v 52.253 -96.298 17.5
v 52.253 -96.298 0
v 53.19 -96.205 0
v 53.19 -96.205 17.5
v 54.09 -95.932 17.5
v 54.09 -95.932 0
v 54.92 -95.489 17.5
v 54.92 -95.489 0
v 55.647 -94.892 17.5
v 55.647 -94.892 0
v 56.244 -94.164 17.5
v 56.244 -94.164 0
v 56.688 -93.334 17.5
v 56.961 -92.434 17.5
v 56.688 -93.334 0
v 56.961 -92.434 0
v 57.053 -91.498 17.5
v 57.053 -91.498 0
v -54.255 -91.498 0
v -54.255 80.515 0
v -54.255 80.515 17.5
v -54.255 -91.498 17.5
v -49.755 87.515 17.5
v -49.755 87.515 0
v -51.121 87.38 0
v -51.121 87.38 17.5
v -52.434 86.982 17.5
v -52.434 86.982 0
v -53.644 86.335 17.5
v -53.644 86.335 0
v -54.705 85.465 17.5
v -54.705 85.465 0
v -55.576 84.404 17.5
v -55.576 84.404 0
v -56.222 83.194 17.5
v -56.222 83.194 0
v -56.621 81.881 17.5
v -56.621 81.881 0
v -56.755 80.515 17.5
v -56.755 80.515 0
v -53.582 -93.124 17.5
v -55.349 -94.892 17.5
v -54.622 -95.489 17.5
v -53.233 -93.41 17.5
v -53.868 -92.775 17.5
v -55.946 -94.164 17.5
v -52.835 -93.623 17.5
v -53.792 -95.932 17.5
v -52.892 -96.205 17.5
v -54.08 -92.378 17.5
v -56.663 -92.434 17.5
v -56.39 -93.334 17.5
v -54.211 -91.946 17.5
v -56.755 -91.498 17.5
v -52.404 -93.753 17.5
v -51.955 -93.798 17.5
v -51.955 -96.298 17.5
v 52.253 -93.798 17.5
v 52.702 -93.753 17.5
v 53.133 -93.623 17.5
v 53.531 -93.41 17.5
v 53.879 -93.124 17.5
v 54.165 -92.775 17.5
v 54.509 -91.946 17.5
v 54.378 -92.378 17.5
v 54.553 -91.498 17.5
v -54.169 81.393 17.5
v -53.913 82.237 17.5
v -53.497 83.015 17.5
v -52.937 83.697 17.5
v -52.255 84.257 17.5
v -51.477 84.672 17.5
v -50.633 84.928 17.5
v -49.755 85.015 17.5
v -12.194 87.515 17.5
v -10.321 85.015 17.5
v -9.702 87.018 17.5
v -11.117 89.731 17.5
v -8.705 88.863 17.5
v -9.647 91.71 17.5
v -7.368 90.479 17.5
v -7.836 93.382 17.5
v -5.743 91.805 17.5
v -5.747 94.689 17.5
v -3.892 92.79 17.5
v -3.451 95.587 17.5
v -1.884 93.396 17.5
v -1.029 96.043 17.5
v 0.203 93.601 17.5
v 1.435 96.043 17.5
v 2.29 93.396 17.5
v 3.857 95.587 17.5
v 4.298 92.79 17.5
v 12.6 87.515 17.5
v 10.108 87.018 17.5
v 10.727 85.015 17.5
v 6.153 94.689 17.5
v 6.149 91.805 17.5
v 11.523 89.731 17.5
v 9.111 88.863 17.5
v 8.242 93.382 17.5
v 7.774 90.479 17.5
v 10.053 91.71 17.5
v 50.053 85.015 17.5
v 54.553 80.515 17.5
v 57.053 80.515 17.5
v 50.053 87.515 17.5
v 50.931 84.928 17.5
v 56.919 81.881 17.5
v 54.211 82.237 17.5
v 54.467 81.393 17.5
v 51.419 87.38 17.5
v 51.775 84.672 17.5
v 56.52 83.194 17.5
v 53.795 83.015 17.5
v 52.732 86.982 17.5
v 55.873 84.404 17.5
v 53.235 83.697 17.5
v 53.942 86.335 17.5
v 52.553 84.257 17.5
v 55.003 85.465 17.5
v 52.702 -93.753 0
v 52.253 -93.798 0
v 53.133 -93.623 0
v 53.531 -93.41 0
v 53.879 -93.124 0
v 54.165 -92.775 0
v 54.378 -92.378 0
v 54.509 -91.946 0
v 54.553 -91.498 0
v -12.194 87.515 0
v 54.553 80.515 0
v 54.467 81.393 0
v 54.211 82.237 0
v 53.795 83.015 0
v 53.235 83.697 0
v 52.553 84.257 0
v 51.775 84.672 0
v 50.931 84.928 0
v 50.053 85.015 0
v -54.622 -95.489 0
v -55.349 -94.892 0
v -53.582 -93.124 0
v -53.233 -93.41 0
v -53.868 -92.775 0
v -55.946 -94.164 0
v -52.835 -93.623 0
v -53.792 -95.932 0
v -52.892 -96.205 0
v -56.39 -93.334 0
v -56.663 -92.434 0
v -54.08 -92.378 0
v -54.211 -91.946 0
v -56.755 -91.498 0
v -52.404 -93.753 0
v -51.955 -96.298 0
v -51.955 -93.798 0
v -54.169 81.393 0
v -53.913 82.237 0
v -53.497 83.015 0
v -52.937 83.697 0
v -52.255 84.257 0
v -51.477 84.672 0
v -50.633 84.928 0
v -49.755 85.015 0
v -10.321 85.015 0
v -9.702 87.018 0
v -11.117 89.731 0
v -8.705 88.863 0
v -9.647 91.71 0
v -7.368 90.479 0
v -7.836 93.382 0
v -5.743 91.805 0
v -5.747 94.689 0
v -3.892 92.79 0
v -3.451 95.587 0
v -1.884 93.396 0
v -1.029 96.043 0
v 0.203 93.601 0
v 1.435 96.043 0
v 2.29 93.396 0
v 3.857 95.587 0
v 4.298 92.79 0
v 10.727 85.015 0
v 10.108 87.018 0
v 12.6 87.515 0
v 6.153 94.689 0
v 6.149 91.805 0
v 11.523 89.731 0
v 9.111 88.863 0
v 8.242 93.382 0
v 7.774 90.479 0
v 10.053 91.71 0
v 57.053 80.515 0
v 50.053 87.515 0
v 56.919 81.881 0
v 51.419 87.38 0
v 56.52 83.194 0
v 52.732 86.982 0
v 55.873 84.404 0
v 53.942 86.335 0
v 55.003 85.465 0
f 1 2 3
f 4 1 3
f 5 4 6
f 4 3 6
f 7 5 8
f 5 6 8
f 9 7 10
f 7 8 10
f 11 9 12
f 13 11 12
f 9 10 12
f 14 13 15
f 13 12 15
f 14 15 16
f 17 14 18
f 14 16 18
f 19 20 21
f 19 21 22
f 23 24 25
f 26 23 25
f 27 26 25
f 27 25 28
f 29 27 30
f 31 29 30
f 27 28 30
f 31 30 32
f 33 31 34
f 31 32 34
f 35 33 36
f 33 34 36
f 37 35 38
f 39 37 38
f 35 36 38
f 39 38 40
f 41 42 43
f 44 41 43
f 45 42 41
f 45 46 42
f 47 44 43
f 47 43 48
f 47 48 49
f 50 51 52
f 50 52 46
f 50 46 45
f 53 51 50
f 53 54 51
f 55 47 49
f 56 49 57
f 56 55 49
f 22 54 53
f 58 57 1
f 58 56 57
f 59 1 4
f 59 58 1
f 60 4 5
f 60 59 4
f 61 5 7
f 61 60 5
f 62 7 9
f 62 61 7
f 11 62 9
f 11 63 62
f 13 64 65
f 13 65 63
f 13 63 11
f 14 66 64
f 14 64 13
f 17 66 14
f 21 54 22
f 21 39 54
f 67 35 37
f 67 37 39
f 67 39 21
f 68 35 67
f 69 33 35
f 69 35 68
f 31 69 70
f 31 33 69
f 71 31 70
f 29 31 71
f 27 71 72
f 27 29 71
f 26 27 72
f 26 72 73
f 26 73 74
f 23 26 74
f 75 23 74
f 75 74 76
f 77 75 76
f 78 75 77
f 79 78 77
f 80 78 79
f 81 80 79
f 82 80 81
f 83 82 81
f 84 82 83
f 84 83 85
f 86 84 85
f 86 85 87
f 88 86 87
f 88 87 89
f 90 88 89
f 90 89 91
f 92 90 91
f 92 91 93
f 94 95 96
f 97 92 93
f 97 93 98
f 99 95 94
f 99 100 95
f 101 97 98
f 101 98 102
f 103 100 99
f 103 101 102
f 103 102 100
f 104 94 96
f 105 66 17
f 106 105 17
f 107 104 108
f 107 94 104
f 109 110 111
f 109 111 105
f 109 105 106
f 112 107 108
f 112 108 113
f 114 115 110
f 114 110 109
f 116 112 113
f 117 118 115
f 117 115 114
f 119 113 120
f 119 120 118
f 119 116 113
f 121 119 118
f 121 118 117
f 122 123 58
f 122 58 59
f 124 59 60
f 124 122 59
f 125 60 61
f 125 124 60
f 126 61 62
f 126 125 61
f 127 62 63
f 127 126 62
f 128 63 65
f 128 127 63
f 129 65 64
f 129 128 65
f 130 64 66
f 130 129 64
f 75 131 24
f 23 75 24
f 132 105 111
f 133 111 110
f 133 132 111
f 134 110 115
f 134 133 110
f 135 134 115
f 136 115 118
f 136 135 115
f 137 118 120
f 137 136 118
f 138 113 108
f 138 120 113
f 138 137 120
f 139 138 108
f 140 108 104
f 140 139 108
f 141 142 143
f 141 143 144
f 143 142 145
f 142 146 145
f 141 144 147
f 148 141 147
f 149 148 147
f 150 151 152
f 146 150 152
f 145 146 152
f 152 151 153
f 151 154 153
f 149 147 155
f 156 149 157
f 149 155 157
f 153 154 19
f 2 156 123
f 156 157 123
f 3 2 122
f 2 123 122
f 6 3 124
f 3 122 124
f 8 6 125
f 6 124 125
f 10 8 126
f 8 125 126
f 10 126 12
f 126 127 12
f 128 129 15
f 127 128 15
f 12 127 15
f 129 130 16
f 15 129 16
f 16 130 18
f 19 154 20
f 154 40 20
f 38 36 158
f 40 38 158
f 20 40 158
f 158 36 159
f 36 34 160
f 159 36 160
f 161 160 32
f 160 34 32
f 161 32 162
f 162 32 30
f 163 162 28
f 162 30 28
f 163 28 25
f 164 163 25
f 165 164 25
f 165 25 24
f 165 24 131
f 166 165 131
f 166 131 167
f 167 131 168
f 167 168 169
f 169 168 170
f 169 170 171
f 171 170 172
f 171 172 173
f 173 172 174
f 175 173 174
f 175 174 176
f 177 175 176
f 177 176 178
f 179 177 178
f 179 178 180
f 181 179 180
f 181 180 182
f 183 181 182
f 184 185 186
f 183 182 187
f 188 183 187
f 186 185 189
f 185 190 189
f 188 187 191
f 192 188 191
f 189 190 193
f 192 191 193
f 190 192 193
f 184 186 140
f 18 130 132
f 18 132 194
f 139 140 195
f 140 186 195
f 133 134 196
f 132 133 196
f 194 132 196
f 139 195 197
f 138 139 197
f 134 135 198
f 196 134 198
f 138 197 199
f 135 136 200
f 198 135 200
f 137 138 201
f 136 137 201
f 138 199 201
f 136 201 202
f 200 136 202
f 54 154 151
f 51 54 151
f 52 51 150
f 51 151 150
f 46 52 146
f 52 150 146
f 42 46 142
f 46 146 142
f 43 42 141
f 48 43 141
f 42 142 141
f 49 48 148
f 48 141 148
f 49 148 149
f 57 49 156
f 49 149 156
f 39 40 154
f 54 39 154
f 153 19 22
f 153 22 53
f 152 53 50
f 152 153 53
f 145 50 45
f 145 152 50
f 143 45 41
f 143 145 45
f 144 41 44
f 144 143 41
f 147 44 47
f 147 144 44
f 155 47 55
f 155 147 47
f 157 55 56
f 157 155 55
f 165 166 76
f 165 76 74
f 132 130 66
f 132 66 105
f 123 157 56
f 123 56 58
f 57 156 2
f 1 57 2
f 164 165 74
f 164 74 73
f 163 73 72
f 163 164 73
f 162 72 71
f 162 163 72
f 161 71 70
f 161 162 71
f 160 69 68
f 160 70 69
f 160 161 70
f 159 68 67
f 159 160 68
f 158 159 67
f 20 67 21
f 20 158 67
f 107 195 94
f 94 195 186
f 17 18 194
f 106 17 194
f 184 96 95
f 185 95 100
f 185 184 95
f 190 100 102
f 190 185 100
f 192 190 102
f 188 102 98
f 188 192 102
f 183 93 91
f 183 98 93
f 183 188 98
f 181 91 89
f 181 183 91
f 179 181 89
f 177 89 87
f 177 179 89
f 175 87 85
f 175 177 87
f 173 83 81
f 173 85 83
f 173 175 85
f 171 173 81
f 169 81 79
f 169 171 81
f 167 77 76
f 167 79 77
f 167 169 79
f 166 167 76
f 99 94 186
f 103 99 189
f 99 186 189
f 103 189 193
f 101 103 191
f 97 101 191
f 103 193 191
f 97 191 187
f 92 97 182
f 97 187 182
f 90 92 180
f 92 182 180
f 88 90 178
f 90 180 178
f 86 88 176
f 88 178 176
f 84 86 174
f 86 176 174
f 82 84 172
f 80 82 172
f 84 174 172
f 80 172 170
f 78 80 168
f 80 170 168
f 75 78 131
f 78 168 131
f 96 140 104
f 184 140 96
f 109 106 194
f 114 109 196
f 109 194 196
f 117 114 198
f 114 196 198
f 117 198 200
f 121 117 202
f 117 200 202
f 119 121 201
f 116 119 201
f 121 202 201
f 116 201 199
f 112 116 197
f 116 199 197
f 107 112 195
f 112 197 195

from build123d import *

# Parameters (mm, degrees)
F1_DEPTH = 17.5
F2_T     = -2.5


with BuildPart() as f1:
    # F0 (on Top) → F1 (new body)
    with BuildSketch(Plane.XY):
        with BuildLine():
            Line((50.0531097949, 87.5149464011), (12.6002141586, 87.5149464011))
            ThreePointArc((12.6002141586, 87.5149464011), (0.2029747702, 96.1006367998), (-12.1942646181, 87.5149464011))
            Line((-12.1942646181, 87.5149464011), (-49.7552318573, 87.5149464011))
            ThreePointArc((-49.7552318573, 87.5149464011), (-54.7049793256, 85.4646938694), (-56.7552318573, 80.5149464011))
            Line((-56.7552318573, 80.5149464011), (-56.7552318573, -91.4975939512))
            ThreePointArc((-56.7552318573, -91.4975939512), (-55.349344407, -94.8917065009), (-51.9552318573, -96.2975939512))
            Line((-51.9552318573, -96.2975939512), (52.2531097949, -96.2975939512))
            ThreePointArc((52.2531097949, -96.2975939512), (55.6472223446, -94.8917065009), (57.0531097949, -91.4975939512))
            Line((57.0531097949, -91.4975939512), (57.0531097949, 80.5149464011))
            ThreePointArc((57.0531097949, 80.5149464011), (55.0028572632, 85.4646938694), (50.0531097949, 87.5149464011))
        make_face()
    extrude(amount=F1_DEPTH)

    # F2
    f2_openings = [f1.faces().sort_by_distance(p)[0] for p in [
        (0.149336, -3.73706, 17.5),
        (0.149336, -3.73706, 0),
    ]]
    offset(amount=F2_T, openings=f2_openings, kind=Kind.INTERSECTION)


solid = f1.part
